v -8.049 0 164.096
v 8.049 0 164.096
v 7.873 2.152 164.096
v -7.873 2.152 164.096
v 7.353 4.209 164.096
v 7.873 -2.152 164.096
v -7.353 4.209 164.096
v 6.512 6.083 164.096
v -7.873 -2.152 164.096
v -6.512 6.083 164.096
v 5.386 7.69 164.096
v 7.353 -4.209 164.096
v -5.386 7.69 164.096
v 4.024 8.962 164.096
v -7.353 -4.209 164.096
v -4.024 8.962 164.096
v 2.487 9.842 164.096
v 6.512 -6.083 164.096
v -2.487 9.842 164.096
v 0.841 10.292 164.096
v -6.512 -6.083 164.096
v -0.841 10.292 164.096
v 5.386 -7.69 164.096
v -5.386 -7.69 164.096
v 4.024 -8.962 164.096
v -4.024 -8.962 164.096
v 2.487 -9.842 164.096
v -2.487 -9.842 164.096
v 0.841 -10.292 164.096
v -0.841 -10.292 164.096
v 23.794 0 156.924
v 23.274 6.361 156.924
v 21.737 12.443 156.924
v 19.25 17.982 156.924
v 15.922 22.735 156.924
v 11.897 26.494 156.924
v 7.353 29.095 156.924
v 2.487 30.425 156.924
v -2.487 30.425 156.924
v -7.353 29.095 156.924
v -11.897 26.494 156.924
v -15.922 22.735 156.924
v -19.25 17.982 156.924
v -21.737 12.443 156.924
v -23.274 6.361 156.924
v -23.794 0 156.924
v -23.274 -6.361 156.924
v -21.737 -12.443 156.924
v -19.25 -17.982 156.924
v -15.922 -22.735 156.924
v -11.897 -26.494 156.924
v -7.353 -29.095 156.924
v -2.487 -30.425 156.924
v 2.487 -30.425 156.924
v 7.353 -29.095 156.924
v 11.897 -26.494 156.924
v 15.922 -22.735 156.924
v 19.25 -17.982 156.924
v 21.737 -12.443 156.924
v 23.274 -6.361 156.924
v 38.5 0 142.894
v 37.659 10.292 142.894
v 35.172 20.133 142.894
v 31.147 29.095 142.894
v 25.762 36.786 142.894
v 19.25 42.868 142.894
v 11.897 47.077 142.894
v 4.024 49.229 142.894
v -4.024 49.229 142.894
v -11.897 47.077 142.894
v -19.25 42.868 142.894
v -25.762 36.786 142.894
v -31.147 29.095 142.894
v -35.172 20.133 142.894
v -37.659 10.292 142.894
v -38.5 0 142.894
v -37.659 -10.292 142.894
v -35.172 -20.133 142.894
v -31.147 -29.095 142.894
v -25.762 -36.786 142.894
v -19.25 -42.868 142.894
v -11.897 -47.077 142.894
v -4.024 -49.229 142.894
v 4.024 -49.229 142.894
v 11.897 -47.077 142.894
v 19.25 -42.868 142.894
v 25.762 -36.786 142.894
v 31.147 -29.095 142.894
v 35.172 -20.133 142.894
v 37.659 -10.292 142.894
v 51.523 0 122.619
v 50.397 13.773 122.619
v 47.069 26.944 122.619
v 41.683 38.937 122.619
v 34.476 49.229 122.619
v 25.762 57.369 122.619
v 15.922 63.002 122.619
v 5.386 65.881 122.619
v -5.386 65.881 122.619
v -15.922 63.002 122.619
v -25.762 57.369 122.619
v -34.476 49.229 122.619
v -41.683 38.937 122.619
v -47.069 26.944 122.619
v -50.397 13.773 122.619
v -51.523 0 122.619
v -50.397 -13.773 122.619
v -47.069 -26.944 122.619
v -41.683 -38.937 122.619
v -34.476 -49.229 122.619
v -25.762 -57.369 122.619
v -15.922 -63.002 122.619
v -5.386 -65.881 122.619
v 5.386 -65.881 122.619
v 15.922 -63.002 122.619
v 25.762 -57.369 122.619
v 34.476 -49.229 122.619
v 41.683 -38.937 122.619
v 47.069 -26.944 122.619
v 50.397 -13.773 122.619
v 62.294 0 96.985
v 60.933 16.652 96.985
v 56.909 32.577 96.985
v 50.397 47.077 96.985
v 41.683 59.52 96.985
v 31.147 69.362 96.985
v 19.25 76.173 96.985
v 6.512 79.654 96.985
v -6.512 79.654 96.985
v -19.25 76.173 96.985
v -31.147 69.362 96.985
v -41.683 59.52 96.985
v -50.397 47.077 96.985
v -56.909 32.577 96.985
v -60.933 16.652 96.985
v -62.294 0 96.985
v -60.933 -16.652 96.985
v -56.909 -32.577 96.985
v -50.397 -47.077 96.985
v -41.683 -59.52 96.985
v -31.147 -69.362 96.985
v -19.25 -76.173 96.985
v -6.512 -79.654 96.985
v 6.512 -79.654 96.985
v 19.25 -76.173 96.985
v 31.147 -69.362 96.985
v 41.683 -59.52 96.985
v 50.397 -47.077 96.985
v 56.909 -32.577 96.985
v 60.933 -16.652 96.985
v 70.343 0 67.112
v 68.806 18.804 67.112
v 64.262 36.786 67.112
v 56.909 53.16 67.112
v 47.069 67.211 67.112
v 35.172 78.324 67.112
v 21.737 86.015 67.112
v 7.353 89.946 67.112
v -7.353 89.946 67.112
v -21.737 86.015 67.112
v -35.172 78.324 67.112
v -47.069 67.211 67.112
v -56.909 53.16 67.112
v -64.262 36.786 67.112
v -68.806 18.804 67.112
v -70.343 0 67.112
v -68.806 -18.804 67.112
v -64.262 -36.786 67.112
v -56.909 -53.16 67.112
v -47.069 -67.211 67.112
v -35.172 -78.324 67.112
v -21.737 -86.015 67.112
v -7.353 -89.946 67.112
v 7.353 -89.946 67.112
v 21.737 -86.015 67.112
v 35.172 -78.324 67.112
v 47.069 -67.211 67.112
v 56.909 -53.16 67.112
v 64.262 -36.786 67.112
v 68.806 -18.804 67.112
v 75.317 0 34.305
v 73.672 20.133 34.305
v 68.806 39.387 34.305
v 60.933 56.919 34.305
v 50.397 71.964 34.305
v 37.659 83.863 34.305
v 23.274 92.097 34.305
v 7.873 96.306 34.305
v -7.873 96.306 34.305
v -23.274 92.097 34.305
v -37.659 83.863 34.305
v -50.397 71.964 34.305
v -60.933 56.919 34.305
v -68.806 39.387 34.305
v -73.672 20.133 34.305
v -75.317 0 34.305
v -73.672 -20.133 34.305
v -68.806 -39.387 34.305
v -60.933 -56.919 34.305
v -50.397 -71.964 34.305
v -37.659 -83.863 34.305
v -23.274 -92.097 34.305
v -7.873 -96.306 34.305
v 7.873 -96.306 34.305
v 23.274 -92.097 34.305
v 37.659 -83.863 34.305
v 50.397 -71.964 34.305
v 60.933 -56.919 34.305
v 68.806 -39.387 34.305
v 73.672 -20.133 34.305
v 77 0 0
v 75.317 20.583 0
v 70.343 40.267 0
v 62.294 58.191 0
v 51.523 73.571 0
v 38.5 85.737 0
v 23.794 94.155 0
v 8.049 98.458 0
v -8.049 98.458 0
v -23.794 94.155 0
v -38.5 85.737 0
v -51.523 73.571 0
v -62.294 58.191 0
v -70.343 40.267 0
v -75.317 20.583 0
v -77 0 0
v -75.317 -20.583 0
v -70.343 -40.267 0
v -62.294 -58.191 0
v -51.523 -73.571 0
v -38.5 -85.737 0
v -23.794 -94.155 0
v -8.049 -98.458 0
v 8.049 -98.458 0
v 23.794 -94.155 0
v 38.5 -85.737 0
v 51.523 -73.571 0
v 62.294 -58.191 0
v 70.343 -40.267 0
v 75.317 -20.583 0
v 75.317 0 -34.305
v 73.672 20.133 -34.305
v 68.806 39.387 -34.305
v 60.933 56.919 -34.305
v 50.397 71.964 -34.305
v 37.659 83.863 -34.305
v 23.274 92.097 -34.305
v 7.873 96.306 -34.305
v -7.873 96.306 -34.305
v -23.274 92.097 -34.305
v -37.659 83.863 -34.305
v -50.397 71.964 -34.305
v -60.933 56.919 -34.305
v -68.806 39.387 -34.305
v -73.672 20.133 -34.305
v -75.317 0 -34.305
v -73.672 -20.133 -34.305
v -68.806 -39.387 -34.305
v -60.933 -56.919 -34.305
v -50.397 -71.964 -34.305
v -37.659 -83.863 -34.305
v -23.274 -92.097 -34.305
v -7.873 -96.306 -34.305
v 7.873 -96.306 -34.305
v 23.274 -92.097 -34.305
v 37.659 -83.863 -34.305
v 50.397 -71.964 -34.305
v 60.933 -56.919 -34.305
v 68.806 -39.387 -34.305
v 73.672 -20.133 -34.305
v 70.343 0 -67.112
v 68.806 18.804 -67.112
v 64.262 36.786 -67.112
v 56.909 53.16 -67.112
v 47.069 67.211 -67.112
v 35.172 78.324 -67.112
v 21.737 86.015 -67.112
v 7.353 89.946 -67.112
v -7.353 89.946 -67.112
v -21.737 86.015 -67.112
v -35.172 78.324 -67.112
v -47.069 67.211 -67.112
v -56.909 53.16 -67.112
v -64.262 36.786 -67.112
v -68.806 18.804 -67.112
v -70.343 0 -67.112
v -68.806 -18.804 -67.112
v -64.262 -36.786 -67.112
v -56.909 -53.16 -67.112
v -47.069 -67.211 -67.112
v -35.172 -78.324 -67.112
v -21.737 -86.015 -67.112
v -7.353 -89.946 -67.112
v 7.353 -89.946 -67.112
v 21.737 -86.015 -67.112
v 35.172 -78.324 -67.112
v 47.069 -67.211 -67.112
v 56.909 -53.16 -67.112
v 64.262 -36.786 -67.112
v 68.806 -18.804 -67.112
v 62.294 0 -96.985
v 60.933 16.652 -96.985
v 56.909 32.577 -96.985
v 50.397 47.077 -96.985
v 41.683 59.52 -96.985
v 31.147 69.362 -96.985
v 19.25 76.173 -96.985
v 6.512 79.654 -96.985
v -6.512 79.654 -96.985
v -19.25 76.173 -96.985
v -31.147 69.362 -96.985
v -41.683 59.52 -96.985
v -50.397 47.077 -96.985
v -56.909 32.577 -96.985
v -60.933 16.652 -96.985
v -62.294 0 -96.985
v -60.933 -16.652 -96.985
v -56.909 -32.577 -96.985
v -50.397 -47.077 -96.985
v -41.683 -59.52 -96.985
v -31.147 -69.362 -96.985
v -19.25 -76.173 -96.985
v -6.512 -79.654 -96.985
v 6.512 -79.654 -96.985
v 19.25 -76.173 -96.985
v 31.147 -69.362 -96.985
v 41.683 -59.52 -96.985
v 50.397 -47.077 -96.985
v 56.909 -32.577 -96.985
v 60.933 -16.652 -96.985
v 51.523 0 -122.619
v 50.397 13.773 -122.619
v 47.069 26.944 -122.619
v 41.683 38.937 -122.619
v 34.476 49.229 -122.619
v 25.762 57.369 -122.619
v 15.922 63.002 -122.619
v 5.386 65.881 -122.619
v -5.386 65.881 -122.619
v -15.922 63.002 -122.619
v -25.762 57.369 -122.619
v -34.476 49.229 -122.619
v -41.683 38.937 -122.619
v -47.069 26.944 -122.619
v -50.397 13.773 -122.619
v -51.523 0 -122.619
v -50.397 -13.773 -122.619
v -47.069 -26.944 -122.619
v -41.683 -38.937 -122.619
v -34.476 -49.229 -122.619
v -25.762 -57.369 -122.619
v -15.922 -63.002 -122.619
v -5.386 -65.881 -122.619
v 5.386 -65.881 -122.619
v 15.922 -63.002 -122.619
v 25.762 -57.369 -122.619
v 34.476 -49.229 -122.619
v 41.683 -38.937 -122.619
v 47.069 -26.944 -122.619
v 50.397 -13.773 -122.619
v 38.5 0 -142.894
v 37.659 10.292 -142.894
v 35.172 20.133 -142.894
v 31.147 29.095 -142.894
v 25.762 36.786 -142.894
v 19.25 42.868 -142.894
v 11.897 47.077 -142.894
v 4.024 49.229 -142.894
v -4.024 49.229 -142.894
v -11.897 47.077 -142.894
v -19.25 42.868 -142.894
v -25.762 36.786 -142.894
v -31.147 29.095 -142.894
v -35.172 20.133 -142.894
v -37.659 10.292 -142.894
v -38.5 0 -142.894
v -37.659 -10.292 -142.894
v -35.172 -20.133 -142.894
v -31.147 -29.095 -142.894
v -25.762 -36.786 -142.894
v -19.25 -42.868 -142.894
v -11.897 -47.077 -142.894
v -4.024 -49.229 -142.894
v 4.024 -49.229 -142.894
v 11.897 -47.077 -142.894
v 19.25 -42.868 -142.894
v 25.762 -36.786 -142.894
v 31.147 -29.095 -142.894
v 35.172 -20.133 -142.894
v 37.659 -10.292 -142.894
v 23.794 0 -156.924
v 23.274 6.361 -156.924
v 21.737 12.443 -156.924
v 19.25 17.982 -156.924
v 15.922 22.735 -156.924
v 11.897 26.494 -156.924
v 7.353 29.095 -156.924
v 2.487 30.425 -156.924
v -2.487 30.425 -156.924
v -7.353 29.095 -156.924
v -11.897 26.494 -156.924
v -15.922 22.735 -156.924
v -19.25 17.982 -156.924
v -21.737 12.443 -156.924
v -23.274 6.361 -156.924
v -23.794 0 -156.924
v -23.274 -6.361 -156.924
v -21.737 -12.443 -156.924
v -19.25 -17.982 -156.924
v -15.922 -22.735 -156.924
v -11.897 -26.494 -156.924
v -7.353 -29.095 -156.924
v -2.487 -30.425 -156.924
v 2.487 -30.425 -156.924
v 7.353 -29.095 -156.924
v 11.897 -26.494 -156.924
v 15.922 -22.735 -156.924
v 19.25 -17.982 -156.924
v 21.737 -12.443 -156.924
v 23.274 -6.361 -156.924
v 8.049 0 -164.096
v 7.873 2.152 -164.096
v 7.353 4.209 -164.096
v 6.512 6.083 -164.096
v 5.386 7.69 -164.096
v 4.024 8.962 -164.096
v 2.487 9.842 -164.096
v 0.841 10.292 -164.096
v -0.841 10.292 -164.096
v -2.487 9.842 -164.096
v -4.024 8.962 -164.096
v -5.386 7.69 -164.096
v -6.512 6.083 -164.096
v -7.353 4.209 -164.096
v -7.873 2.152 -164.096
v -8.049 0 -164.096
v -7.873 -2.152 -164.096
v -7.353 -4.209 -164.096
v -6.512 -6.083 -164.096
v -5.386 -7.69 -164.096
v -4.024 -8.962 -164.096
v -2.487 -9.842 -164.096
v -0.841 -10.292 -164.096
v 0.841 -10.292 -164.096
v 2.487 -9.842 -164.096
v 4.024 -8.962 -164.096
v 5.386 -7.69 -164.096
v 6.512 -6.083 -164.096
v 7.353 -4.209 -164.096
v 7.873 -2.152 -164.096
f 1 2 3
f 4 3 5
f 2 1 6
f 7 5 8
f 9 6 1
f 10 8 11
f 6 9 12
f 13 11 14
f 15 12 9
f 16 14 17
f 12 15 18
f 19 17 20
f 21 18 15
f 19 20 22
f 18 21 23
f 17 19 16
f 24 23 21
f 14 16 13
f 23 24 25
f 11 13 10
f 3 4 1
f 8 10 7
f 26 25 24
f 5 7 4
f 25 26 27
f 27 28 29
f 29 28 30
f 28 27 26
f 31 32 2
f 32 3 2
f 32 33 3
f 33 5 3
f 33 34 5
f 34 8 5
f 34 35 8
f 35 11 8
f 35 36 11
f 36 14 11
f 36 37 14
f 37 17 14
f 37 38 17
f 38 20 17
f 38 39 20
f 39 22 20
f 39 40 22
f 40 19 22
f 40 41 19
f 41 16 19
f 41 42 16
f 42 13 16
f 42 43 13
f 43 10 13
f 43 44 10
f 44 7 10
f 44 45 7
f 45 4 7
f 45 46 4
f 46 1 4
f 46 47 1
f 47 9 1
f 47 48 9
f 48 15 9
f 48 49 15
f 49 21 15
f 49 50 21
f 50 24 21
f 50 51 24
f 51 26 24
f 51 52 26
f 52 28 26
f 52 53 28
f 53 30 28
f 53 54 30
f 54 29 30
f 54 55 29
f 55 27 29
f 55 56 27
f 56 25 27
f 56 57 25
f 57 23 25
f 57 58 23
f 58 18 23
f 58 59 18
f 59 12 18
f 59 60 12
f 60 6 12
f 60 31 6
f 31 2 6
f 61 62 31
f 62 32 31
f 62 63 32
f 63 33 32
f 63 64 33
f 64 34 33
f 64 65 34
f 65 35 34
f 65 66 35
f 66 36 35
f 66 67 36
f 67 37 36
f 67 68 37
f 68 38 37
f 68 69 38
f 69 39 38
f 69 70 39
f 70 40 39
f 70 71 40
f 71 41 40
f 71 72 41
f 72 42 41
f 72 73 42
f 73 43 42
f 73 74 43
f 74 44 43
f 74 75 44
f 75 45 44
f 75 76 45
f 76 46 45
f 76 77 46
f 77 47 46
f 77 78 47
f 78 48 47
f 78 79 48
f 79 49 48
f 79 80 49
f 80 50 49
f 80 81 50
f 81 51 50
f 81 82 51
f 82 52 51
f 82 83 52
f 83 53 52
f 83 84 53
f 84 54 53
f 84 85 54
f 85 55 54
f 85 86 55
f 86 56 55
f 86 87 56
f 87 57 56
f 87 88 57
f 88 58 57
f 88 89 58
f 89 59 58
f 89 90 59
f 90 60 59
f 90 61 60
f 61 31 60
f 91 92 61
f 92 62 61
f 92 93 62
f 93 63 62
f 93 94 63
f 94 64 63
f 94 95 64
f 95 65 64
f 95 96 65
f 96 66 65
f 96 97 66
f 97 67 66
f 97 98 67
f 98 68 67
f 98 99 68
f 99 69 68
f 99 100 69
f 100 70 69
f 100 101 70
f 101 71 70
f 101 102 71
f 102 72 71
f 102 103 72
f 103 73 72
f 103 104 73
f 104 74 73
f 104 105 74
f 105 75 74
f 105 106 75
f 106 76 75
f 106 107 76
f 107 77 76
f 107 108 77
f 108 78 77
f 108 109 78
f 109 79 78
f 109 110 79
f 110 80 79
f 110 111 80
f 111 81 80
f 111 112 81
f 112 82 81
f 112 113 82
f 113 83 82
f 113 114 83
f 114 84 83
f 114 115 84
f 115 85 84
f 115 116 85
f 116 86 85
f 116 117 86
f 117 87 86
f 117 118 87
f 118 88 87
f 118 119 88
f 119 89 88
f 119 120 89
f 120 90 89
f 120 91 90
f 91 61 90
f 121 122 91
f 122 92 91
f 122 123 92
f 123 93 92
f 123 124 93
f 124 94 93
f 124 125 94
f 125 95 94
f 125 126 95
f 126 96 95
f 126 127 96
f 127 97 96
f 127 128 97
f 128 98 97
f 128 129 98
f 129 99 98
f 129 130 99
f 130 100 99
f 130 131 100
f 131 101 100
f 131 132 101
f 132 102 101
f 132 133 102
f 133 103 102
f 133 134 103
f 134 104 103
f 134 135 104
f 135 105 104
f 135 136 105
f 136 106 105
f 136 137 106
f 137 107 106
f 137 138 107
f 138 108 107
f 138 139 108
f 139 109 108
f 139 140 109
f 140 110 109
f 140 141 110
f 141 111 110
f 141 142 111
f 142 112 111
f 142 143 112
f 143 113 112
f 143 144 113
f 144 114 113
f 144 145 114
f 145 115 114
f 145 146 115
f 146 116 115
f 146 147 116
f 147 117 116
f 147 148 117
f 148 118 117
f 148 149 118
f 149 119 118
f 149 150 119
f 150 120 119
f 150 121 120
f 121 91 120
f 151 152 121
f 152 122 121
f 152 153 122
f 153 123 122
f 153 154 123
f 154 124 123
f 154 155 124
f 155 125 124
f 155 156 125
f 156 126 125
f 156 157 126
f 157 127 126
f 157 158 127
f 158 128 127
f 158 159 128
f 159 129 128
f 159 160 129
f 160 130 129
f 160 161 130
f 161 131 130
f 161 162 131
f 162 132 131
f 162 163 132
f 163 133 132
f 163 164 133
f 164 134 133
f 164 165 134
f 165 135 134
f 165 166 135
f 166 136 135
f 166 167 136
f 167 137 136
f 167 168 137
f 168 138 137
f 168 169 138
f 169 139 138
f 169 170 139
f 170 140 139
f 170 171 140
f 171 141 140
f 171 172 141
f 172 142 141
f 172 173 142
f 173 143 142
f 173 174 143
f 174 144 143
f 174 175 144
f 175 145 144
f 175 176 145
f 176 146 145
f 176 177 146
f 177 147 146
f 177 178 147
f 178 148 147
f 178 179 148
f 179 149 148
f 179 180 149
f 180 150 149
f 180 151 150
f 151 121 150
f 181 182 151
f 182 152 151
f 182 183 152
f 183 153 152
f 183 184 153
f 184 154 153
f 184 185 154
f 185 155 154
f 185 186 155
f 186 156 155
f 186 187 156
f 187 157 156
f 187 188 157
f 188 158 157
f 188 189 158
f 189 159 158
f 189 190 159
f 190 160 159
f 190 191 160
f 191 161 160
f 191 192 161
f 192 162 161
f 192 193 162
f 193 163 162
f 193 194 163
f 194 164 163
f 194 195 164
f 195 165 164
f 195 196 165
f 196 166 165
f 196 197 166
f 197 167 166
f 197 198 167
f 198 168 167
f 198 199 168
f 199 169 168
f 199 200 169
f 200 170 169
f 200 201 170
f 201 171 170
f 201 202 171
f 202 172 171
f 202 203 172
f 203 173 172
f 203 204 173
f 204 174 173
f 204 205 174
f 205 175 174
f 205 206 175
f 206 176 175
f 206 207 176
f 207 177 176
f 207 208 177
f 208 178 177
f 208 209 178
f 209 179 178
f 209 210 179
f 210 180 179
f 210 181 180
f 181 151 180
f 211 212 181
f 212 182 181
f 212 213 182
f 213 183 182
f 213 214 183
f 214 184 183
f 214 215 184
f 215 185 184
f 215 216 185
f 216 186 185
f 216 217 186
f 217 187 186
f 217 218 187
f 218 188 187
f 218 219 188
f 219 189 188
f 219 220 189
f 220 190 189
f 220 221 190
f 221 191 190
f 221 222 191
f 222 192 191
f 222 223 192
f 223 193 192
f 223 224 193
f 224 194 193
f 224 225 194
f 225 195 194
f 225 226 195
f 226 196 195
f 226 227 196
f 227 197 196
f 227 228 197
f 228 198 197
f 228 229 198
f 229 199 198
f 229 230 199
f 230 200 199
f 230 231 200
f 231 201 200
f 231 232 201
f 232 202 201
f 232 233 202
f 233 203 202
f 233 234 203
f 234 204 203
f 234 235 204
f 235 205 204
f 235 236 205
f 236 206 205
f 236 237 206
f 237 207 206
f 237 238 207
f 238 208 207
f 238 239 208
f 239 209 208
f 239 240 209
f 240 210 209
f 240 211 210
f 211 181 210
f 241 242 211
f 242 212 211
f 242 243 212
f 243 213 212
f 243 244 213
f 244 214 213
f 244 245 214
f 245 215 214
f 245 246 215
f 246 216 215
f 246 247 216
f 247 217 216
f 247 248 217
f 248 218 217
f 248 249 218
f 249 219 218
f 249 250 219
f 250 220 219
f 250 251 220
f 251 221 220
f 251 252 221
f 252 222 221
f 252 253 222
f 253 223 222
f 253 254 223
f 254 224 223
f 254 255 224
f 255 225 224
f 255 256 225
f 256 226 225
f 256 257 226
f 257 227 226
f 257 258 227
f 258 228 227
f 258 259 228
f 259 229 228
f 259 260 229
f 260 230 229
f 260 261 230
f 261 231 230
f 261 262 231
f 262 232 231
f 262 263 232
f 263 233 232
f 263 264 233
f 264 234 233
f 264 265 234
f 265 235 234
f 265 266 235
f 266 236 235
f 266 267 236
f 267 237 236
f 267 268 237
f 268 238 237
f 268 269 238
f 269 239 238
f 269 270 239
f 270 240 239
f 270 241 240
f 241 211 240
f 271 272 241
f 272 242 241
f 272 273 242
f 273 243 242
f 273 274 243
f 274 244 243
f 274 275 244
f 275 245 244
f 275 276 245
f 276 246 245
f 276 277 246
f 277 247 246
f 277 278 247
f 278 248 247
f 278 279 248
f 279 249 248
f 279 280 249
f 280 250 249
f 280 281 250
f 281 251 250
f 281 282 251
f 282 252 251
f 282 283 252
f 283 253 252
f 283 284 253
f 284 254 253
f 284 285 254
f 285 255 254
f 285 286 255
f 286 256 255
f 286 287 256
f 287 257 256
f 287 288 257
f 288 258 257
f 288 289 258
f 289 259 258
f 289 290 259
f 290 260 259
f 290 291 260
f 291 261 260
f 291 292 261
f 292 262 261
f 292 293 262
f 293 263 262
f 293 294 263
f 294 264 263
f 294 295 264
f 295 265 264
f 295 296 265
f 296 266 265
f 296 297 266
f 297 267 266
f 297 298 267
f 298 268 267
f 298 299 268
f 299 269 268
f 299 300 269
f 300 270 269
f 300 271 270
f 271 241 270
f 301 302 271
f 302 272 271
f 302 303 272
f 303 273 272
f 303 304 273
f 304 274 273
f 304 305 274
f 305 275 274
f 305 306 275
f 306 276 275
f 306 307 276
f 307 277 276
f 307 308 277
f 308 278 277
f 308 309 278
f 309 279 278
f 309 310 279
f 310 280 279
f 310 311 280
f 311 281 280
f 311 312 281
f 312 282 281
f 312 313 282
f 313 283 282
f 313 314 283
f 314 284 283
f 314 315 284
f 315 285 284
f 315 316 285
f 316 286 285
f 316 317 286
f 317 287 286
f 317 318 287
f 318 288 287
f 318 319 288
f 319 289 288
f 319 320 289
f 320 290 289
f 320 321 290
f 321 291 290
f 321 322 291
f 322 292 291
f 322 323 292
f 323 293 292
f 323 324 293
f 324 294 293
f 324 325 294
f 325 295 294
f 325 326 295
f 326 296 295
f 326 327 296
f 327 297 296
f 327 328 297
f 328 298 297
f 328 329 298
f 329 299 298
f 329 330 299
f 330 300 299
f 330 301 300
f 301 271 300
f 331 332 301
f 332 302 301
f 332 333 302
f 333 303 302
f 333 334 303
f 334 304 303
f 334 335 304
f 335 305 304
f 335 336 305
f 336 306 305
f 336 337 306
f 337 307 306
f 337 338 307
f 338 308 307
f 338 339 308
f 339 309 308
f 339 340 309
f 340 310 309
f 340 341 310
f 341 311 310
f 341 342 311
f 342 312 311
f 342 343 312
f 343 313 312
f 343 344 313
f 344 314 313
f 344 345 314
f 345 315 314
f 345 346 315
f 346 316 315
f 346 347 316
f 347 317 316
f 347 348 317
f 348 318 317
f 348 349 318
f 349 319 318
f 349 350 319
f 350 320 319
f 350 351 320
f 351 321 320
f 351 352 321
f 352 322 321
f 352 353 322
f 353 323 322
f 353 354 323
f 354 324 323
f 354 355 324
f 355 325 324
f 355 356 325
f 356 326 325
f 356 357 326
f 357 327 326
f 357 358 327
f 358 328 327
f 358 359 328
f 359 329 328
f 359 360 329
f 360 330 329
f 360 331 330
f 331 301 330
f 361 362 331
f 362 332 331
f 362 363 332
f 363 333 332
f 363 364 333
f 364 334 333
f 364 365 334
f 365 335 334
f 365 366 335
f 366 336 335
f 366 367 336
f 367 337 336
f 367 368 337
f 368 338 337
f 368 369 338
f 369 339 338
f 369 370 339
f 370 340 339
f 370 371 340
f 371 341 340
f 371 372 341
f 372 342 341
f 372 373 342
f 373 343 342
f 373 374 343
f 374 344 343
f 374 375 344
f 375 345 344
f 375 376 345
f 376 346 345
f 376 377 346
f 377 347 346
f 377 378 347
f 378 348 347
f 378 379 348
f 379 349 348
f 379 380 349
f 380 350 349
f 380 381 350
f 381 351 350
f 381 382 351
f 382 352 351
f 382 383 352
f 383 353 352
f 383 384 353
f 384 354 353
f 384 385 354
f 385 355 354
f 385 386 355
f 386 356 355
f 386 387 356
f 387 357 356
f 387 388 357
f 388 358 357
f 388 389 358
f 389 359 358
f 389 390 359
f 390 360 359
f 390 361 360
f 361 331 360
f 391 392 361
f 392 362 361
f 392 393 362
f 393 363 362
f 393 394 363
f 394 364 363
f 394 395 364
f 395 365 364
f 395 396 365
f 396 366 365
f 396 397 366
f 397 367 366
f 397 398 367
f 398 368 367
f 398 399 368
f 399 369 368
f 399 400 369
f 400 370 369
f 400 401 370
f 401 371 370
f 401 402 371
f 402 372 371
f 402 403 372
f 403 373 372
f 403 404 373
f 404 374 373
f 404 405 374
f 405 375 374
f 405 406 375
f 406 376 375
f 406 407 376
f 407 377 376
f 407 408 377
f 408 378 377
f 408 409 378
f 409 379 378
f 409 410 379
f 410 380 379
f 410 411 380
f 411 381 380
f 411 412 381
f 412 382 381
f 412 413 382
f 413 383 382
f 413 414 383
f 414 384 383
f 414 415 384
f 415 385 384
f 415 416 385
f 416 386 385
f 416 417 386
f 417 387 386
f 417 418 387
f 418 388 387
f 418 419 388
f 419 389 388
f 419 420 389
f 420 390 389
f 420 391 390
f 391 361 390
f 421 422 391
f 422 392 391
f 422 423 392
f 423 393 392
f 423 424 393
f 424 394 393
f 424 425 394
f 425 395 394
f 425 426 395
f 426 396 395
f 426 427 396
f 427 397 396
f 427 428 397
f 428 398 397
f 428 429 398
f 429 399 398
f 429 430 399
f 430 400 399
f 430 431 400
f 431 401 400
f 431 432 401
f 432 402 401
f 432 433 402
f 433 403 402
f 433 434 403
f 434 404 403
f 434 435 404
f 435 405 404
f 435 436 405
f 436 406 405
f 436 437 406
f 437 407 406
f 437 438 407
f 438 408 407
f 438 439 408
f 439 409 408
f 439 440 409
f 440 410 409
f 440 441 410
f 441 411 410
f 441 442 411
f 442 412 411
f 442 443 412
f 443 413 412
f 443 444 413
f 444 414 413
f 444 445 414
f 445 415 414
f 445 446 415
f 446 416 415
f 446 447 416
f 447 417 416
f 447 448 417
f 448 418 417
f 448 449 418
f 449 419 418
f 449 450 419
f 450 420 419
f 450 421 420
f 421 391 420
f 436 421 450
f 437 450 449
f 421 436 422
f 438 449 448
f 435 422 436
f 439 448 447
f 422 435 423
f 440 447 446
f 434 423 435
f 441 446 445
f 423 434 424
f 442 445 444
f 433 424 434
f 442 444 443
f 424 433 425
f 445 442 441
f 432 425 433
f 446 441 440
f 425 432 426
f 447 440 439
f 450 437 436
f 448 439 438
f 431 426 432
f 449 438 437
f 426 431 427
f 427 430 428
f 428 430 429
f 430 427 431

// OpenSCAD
// Generated by SolidPython 1.0.1 on 2020-07-29 00:46:47


scale(v = [7, 9, 15]) {
	sphere(r = 11);
}
/***********************************************
*********      SolidPython code:      **********
************************************************
 
# import packages: SolidPython
from solid import *
from solid.utils import *
from itertools import chain, combinations, permutations


class Resize:

    def __init__(self, scad_file):
        self.scad_file = scad_file
        #self.scad_file = import_scad(scad_file)
        # cone/cylinder param:
        self.r1 = 0
        self.r2 = 0
        self.h = 0
        # rectangular prism param:
        self.w = 0
        self.l = 0
        # ellipse param:
        self.r = 0

    # import OpenScad code (file name corresponds to shape)


    # classify shape + parameters
    def assign(self, param1, param2, param3):
        if self.scad_file == 'cone.scad':
            self.r1 = param1
            self.r2 = param2
            self.h = param3
        elif self.scad_file == 'cylinder.scad':
            self.r1 = param1
            self.r2 = param2
            self.h = param3
        elif self.scad_file == 'rectangularPrism.scad':
            self.h = param1
            self.l = param2
            self.w = param3
        else:
            self.r = param1
            self.h = param2

    # resize parameters
    def iterate(self):
        x = range(3, 20, 2)
        i = 1
        if self.scad_file == 'cone.scad':
            tempList = list(permutations(x, 2))
            for temp in tempList:
                param1 = temp[0]
                param2 = temp[1]
                filepath = 'produced_scad_files/' + 'cone' + str(param1) + '_' + str(param2) + '_' + '.scad'
                scad_render_to_file(cylinder(h=param1, r1=param2, r2=0), filepath)

        elif self.scad_file == 'cylinder.scad':
            tempList = list(permutations(x, 3))
            for temp in tempList:
                param1 = temp[0]
                param2 = temp[1]
                filepath = 'produced_scad_files/' + 'cylinder' + str(param1) + '_' + str(param2) + '_' + '.scad'
                scad_render_to_file(cylinder(h=param1, r1=param2, r2=param2), filepath)

        elif self.scad_file == 'rectangularPrism.scad':
            tempList = list(permutations(x, 3))
            for temp in tempList:
                param1 = temp[0]
                param2 = temp[1]
                param3 = temp[2]
                filepath = 'produced_scad_files/' + 'rectangularPrism' + str(param1) + '_' + str(param2) + '_' + str(
                    param3) + '.scad'
                scad_render_to_file(cube(size=(param1, param2, param3)), filepath)

        elif self.scad_file == 'ellipse.scad':
            tempList = list(permutations(x, 4))
            for temp in tempList:
                param1 = temp[0]
                param2 = temp[1]
                param3 = temp[2]
                param4 = temp[3]
                filepath = 'produced_scad_files/' + 'ellipse' + str(param1) + '_' + str(param2) + '_' + str(param3) + '_' + str(param4) + '.scad'
                scad_render_to_file(scale([param1, param2, param3])(sphere(r=param4)), filepath)

    def render_to_scadfile(self):
        scad_render_to_file(scad, 'example.scad') 
 
************************************************/
